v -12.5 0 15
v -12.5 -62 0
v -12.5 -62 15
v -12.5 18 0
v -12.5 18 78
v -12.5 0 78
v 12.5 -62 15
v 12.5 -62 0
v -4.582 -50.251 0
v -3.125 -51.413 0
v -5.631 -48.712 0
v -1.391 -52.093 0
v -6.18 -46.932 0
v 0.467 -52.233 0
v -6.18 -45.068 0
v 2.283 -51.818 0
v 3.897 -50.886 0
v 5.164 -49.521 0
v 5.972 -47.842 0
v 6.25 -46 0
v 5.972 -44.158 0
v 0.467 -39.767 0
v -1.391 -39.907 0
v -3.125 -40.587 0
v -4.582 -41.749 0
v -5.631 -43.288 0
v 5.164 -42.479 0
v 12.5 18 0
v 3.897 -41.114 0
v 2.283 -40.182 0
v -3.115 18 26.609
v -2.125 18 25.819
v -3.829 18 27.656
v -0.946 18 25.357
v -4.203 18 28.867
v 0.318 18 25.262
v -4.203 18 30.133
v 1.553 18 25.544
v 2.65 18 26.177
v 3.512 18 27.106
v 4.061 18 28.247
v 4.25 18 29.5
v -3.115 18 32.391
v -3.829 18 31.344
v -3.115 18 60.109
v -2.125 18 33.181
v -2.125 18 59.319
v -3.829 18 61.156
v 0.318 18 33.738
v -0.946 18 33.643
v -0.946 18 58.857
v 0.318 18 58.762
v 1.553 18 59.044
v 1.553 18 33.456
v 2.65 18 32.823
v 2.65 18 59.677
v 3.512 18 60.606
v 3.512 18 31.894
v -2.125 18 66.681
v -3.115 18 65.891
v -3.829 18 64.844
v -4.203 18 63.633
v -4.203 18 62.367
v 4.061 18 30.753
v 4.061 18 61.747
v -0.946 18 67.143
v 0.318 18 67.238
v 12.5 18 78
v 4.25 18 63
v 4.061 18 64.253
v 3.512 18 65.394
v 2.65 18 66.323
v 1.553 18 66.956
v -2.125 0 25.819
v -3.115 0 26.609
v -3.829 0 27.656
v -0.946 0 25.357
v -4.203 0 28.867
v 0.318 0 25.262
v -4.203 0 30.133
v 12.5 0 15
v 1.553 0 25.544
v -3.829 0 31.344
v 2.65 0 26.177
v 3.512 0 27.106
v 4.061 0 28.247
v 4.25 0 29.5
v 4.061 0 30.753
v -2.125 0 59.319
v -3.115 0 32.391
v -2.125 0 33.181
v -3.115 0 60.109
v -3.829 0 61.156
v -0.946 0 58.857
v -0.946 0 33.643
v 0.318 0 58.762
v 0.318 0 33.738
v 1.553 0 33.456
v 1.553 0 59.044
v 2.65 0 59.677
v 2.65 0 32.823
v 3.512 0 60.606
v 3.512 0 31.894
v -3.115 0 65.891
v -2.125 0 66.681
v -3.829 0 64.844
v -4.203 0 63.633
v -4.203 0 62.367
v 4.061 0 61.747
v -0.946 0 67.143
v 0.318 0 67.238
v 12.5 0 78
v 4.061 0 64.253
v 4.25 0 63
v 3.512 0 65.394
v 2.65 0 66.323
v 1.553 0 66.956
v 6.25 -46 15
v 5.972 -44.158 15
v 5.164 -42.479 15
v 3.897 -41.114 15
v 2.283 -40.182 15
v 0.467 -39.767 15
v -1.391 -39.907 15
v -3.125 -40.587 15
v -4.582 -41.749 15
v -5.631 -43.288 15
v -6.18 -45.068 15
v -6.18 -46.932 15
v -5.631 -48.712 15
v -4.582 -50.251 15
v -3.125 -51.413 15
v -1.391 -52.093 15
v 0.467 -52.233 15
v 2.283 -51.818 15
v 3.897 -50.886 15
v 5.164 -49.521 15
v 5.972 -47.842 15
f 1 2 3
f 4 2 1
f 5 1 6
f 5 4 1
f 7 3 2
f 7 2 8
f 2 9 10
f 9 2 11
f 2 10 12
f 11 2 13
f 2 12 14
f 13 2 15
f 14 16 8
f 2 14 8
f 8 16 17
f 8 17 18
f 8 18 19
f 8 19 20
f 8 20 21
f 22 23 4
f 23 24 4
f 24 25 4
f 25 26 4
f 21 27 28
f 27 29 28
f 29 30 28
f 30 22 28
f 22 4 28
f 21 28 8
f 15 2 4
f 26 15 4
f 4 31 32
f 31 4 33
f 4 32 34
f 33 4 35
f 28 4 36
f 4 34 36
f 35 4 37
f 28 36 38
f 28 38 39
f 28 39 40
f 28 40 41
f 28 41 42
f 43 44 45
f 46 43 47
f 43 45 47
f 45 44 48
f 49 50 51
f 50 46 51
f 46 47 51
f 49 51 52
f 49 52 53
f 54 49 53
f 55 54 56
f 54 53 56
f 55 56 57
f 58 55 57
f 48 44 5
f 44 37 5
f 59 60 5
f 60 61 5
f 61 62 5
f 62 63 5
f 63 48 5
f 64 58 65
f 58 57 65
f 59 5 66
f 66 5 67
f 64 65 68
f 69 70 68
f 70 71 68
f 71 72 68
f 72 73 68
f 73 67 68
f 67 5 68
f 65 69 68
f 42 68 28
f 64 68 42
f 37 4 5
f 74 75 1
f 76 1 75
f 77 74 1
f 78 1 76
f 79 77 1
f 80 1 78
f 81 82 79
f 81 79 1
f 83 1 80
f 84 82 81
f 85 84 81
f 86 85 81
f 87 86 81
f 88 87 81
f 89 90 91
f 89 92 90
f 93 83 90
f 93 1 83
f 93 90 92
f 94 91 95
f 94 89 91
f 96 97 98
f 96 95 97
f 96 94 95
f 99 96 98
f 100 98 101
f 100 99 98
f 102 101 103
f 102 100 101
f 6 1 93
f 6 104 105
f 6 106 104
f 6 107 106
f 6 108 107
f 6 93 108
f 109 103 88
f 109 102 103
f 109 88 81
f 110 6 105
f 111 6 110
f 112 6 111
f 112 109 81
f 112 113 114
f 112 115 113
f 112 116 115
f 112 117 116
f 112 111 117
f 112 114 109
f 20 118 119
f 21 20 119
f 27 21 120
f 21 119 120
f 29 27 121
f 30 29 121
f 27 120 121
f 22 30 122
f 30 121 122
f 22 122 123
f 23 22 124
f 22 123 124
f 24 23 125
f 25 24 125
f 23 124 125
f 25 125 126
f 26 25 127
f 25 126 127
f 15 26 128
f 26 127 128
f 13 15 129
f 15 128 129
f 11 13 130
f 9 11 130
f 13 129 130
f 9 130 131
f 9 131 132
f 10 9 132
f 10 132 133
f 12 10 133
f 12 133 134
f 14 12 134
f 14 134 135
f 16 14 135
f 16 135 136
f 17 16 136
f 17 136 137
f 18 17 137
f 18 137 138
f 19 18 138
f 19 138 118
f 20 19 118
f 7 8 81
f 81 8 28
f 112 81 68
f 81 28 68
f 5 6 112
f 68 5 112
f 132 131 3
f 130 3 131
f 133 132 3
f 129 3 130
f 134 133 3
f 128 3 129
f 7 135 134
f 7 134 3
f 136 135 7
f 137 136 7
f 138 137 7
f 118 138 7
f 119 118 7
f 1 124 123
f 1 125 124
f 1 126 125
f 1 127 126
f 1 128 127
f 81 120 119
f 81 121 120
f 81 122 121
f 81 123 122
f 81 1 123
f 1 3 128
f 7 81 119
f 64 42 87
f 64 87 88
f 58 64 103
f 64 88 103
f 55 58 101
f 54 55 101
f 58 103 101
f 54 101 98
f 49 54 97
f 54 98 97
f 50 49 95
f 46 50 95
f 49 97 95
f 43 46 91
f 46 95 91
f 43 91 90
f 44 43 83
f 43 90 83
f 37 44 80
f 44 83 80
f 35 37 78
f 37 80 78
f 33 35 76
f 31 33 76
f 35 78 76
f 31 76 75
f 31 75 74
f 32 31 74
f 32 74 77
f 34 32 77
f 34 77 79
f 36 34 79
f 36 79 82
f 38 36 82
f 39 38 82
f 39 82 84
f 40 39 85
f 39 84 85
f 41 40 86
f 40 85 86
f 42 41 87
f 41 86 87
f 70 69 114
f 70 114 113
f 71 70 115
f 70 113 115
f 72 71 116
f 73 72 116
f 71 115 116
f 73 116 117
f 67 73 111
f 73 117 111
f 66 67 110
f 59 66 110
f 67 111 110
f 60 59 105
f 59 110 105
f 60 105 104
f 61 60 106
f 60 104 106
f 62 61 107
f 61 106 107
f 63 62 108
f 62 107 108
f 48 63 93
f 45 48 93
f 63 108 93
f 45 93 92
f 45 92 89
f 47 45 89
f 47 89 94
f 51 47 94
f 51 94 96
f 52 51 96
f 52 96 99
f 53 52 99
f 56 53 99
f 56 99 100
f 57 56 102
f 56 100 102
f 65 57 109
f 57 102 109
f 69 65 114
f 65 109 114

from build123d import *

# Parameters (mm, degrees)
F0_W     = 25
F0_H     = 15
F0_H_2   = 63
F0_R     = 4.25
F1_DEPTH = 18
F2_DEPTH = 62
F3_R     = 6.25
F4_DEPTH = 25.4


with BuildPart() as f1:
    # F0 (on Front) → F1 (new body)
    with BuildSketch(Plane.XZ):
        with Locations((0, 7.5)):
            Rectangle(F0_W, F0_H)
        with Locations((0, 46.5)):
            Rectangle(F0_W, F0_H_2)
        with Locations((0, 29.5)):
            Circle(F0_R, mode=Mode.SUBTRACT)
        with Locations((0, 63)):
            Circle(F0_R, mode=Mode.SUBTRACT)
    extrude(amount=-F1_DEPTH)

    # F0 (on Front) → F2 (join)
    with BuildSketch(Plane.XZ):
        with Locations((0, 7.5)):
            Rectangle(F0_W, F0_H)
    extrude(amount=F2_DEPTH)

    # F3 (on face) → F4 (cut)
    with BuildSketch(Plane.XY.offset(15)):
        with Locations((0, -46)):
            Circle(F3_R)
    extrude(amount=-F4_DEPTH, mode=Mode.SUBTRACT)


solid = f1.part
